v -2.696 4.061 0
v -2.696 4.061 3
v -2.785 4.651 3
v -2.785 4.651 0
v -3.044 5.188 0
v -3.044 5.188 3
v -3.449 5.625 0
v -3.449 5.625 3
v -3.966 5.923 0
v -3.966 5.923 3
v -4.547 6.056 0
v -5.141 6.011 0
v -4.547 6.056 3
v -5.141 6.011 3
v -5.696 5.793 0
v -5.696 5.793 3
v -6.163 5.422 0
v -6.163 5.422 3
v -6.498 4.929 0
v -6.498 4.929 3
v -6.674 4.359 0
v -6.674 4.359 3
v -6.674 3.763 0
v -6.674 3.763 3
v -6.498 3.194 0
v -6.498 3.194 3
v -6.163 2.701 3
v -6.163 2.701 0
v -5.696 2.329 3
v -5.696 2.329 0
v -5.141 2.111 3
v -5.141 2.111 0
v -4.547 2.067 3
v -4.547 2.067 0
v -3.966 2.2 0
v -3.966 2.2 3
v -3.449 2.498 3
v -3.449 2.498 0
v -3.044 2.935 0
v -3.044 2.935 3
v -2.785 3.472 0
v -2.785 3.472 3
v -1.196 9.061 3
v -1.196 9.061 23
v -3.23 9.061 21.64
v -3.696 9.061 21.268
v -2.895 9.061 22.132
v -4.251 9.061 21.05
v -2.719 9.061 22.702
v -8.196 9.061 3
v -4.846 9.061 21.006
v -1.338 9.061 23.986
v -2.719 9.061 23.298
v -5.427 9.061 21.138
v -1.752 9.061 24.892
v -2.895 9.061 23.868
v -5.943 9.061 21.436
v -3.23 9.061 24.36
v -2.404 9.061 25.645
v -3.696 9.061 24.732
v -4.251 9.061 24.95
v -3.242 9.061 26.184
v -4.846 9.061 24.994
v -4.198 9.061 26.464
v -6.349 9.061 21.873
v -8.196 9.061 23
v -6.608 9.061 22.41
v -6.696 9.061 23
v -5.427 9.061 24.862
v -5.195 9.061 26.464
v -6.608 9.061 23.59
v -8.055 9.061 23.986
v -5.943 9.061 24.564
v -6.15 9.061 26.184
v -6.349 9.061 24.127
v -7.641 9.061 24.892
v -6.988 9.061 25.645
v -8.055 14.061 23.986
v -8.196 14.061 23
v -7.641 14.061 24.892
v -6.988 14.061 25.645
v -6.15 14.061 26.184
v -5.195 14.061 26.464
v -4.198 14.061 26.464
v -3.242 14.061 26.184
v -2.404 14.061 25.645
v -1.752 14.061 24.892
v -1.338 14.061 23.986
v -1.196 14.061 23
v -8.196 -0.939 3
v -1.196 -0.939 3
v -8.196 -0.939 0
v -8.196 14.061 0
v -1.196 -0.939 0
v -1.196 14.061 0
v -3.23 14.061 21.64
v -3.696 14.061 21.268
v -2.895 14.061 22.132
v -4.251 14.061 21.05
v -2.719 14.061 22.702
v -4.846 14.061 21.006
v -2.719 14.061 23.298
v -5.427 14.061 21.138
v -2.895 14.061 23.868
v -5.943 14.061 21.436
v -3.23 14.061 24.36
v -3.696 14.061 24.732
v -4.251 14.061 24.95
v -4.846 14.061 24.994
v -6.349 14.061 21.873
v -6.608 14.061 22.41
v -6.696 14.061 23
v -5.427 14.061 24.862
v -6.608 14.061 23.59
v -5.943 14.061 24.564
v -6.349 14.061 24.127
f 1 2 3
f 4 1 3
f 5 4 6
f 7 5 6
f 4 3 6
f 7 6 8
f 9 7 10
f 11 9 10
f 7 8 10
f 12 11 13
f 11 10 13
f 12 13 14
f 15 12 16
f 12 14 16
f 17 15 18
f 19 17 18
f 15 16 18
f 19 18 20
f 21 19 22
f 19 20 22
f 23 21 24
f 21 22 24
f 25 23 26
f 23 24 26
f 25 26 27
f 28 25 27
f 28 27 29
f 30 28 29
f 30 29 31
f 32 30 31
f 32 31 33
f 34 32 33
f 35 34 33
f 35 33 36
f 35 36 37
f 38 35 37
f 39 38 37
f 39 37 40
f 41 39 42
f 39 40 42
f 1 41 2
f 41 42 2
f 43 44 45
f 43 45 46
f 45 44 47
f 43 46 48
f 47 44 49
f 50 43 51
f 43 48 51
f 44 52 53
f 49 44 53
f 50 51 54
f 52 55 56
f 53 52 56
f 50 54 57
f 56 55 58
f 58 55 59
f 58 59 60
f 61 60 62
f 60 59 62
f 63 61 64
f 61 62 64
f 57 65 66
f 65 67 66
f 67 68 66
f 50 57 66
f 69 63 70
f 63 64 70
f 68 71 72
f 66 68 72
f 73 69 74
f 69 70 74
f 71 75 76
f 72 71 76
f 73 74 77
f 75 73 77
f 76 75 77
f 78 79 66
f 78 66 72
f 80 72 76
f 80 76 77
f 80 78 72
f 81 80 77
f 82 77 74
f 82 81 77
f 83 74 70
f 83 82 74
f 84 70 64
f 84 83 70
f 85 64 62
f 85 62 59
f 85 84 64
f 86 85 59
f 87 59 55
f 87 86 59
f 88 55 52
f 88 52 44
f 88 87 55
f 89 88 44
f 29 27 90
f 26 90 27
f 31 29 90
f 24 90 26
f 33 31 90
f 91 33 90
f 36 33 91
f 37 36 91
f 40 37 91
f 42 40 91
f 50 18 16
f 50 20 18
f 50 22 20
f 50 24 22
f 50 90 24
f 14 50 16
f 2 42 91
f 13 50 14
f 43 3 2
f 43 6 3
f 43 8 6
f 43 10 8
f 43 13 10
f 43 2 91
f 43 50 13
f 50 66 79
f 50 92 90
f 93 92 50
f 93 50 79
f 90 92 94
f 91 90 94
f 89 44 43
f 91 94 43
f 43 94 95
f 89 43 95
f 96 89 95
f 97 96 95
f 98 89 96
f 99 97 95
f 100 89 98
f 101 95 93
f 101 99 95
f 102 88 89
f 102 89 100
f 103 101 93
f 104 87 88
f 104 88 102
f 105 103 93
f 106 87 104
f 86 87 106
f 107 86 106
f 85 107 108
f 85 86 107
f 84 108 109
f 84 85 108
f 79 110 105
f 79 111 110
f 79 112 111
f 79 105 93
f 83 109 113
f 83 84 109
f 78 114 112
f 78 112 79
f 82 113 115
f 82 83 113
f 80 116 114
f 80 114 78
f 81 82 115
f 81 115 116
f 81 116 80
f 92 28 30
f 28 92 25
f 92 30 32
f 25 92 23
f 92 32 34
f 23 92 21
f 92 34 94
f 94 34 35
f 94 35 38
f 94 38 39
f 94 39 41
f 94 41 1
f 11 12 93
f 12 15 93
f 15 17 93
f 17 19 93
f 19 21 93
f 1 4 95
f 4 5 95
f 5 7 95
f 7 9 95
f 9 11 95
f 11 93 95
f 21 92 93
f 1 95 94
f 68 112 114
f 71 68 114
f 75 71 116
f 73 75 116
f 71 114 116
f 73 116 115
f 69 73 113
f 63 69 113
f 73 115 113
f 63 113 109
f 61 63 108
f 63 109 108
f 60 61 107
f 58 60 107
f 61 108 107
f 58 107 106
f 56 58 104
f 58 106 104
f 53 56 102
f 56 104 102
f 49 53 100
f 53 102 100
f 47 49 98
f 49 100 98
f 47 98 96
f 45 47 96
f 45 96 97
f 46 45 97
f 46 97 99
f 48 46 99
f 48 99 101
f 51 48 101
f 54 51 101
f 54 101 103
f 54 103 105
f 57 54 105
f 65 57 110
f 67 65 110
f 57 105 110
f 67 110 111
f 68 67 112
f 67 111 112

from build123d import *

# Parameters (mm, degrees)
F0_W     = 7
F0_H     = 5
F0_H_2   = 10
F1_DEPTH = 3
F2_W     = 7
F2_H     = 5
F3_DEPTH = 20
F5_DEPTH = 5
F6_R     = 2
F7_DEPTH = 5
F8_R     = 2
F9_DEPTH = 3


with BuildPart() as f1:
    # F0 (on Top) → F1 (new body)
    with BuildSketch(Plane.XY):
        with Locations((-4.6964466444, 11.5613198653)):
            Rectangle(F0_W, F0_H)
        with Locations((-4.6964466444, 4.0613198653)):
            Rectangle(F0_W, F0_H_2)
    extrude(amount=F1_DEPTH)

    # F2 (on face) → F3 (join)
    with BuildSketch(Plane.XY.offset(3)):
        with Locations((-4.6964466444, 11.5613198653)):
            Rectangle(F2_W, F2_H)
    extrude(amount=F3_DEPTH)

    # F4 (on face) → F5 (join, through all)
    with BuildSketch(Plane(origin=(0, 14.0613198653, 0), x_dir=(-1, 0, 0), z_dir=(0, 1, 0))):
        with BuildLine():
            Line((1.1964466444, 23), (8.1964466444, 23))
            ThreePointArc((8.1964466444, 23), (4.6964466444, 26.5), (1.1964466444, 23))
        make_face()
    extrude(amount=-F5_DEPTH)

    # F6 (on face) → F7 (cut, through all)
    with BuildSketch(Plane(origin=(0, 14.0613198653, 0), x_dir=(-1, 0, 0), z_dir=(0, 1, 0))):
        with Locations((4.6964466444, 23)):
            Circle(F6_R)
    extrude(amount=-F7_DEPTH, mode=Mode.SUBTRACT)

    # F8 (on face) → F9 (cut, through all)
    with BuildSketch(Plane.XY.offset(3)):
        with Locations((-4.6964466444, 4.0613198653)):
            Circle(F8_R)
    extrude(amount=-F9_DEPTH, mode=Mode.SUBTRACT)


solid = f1.part
